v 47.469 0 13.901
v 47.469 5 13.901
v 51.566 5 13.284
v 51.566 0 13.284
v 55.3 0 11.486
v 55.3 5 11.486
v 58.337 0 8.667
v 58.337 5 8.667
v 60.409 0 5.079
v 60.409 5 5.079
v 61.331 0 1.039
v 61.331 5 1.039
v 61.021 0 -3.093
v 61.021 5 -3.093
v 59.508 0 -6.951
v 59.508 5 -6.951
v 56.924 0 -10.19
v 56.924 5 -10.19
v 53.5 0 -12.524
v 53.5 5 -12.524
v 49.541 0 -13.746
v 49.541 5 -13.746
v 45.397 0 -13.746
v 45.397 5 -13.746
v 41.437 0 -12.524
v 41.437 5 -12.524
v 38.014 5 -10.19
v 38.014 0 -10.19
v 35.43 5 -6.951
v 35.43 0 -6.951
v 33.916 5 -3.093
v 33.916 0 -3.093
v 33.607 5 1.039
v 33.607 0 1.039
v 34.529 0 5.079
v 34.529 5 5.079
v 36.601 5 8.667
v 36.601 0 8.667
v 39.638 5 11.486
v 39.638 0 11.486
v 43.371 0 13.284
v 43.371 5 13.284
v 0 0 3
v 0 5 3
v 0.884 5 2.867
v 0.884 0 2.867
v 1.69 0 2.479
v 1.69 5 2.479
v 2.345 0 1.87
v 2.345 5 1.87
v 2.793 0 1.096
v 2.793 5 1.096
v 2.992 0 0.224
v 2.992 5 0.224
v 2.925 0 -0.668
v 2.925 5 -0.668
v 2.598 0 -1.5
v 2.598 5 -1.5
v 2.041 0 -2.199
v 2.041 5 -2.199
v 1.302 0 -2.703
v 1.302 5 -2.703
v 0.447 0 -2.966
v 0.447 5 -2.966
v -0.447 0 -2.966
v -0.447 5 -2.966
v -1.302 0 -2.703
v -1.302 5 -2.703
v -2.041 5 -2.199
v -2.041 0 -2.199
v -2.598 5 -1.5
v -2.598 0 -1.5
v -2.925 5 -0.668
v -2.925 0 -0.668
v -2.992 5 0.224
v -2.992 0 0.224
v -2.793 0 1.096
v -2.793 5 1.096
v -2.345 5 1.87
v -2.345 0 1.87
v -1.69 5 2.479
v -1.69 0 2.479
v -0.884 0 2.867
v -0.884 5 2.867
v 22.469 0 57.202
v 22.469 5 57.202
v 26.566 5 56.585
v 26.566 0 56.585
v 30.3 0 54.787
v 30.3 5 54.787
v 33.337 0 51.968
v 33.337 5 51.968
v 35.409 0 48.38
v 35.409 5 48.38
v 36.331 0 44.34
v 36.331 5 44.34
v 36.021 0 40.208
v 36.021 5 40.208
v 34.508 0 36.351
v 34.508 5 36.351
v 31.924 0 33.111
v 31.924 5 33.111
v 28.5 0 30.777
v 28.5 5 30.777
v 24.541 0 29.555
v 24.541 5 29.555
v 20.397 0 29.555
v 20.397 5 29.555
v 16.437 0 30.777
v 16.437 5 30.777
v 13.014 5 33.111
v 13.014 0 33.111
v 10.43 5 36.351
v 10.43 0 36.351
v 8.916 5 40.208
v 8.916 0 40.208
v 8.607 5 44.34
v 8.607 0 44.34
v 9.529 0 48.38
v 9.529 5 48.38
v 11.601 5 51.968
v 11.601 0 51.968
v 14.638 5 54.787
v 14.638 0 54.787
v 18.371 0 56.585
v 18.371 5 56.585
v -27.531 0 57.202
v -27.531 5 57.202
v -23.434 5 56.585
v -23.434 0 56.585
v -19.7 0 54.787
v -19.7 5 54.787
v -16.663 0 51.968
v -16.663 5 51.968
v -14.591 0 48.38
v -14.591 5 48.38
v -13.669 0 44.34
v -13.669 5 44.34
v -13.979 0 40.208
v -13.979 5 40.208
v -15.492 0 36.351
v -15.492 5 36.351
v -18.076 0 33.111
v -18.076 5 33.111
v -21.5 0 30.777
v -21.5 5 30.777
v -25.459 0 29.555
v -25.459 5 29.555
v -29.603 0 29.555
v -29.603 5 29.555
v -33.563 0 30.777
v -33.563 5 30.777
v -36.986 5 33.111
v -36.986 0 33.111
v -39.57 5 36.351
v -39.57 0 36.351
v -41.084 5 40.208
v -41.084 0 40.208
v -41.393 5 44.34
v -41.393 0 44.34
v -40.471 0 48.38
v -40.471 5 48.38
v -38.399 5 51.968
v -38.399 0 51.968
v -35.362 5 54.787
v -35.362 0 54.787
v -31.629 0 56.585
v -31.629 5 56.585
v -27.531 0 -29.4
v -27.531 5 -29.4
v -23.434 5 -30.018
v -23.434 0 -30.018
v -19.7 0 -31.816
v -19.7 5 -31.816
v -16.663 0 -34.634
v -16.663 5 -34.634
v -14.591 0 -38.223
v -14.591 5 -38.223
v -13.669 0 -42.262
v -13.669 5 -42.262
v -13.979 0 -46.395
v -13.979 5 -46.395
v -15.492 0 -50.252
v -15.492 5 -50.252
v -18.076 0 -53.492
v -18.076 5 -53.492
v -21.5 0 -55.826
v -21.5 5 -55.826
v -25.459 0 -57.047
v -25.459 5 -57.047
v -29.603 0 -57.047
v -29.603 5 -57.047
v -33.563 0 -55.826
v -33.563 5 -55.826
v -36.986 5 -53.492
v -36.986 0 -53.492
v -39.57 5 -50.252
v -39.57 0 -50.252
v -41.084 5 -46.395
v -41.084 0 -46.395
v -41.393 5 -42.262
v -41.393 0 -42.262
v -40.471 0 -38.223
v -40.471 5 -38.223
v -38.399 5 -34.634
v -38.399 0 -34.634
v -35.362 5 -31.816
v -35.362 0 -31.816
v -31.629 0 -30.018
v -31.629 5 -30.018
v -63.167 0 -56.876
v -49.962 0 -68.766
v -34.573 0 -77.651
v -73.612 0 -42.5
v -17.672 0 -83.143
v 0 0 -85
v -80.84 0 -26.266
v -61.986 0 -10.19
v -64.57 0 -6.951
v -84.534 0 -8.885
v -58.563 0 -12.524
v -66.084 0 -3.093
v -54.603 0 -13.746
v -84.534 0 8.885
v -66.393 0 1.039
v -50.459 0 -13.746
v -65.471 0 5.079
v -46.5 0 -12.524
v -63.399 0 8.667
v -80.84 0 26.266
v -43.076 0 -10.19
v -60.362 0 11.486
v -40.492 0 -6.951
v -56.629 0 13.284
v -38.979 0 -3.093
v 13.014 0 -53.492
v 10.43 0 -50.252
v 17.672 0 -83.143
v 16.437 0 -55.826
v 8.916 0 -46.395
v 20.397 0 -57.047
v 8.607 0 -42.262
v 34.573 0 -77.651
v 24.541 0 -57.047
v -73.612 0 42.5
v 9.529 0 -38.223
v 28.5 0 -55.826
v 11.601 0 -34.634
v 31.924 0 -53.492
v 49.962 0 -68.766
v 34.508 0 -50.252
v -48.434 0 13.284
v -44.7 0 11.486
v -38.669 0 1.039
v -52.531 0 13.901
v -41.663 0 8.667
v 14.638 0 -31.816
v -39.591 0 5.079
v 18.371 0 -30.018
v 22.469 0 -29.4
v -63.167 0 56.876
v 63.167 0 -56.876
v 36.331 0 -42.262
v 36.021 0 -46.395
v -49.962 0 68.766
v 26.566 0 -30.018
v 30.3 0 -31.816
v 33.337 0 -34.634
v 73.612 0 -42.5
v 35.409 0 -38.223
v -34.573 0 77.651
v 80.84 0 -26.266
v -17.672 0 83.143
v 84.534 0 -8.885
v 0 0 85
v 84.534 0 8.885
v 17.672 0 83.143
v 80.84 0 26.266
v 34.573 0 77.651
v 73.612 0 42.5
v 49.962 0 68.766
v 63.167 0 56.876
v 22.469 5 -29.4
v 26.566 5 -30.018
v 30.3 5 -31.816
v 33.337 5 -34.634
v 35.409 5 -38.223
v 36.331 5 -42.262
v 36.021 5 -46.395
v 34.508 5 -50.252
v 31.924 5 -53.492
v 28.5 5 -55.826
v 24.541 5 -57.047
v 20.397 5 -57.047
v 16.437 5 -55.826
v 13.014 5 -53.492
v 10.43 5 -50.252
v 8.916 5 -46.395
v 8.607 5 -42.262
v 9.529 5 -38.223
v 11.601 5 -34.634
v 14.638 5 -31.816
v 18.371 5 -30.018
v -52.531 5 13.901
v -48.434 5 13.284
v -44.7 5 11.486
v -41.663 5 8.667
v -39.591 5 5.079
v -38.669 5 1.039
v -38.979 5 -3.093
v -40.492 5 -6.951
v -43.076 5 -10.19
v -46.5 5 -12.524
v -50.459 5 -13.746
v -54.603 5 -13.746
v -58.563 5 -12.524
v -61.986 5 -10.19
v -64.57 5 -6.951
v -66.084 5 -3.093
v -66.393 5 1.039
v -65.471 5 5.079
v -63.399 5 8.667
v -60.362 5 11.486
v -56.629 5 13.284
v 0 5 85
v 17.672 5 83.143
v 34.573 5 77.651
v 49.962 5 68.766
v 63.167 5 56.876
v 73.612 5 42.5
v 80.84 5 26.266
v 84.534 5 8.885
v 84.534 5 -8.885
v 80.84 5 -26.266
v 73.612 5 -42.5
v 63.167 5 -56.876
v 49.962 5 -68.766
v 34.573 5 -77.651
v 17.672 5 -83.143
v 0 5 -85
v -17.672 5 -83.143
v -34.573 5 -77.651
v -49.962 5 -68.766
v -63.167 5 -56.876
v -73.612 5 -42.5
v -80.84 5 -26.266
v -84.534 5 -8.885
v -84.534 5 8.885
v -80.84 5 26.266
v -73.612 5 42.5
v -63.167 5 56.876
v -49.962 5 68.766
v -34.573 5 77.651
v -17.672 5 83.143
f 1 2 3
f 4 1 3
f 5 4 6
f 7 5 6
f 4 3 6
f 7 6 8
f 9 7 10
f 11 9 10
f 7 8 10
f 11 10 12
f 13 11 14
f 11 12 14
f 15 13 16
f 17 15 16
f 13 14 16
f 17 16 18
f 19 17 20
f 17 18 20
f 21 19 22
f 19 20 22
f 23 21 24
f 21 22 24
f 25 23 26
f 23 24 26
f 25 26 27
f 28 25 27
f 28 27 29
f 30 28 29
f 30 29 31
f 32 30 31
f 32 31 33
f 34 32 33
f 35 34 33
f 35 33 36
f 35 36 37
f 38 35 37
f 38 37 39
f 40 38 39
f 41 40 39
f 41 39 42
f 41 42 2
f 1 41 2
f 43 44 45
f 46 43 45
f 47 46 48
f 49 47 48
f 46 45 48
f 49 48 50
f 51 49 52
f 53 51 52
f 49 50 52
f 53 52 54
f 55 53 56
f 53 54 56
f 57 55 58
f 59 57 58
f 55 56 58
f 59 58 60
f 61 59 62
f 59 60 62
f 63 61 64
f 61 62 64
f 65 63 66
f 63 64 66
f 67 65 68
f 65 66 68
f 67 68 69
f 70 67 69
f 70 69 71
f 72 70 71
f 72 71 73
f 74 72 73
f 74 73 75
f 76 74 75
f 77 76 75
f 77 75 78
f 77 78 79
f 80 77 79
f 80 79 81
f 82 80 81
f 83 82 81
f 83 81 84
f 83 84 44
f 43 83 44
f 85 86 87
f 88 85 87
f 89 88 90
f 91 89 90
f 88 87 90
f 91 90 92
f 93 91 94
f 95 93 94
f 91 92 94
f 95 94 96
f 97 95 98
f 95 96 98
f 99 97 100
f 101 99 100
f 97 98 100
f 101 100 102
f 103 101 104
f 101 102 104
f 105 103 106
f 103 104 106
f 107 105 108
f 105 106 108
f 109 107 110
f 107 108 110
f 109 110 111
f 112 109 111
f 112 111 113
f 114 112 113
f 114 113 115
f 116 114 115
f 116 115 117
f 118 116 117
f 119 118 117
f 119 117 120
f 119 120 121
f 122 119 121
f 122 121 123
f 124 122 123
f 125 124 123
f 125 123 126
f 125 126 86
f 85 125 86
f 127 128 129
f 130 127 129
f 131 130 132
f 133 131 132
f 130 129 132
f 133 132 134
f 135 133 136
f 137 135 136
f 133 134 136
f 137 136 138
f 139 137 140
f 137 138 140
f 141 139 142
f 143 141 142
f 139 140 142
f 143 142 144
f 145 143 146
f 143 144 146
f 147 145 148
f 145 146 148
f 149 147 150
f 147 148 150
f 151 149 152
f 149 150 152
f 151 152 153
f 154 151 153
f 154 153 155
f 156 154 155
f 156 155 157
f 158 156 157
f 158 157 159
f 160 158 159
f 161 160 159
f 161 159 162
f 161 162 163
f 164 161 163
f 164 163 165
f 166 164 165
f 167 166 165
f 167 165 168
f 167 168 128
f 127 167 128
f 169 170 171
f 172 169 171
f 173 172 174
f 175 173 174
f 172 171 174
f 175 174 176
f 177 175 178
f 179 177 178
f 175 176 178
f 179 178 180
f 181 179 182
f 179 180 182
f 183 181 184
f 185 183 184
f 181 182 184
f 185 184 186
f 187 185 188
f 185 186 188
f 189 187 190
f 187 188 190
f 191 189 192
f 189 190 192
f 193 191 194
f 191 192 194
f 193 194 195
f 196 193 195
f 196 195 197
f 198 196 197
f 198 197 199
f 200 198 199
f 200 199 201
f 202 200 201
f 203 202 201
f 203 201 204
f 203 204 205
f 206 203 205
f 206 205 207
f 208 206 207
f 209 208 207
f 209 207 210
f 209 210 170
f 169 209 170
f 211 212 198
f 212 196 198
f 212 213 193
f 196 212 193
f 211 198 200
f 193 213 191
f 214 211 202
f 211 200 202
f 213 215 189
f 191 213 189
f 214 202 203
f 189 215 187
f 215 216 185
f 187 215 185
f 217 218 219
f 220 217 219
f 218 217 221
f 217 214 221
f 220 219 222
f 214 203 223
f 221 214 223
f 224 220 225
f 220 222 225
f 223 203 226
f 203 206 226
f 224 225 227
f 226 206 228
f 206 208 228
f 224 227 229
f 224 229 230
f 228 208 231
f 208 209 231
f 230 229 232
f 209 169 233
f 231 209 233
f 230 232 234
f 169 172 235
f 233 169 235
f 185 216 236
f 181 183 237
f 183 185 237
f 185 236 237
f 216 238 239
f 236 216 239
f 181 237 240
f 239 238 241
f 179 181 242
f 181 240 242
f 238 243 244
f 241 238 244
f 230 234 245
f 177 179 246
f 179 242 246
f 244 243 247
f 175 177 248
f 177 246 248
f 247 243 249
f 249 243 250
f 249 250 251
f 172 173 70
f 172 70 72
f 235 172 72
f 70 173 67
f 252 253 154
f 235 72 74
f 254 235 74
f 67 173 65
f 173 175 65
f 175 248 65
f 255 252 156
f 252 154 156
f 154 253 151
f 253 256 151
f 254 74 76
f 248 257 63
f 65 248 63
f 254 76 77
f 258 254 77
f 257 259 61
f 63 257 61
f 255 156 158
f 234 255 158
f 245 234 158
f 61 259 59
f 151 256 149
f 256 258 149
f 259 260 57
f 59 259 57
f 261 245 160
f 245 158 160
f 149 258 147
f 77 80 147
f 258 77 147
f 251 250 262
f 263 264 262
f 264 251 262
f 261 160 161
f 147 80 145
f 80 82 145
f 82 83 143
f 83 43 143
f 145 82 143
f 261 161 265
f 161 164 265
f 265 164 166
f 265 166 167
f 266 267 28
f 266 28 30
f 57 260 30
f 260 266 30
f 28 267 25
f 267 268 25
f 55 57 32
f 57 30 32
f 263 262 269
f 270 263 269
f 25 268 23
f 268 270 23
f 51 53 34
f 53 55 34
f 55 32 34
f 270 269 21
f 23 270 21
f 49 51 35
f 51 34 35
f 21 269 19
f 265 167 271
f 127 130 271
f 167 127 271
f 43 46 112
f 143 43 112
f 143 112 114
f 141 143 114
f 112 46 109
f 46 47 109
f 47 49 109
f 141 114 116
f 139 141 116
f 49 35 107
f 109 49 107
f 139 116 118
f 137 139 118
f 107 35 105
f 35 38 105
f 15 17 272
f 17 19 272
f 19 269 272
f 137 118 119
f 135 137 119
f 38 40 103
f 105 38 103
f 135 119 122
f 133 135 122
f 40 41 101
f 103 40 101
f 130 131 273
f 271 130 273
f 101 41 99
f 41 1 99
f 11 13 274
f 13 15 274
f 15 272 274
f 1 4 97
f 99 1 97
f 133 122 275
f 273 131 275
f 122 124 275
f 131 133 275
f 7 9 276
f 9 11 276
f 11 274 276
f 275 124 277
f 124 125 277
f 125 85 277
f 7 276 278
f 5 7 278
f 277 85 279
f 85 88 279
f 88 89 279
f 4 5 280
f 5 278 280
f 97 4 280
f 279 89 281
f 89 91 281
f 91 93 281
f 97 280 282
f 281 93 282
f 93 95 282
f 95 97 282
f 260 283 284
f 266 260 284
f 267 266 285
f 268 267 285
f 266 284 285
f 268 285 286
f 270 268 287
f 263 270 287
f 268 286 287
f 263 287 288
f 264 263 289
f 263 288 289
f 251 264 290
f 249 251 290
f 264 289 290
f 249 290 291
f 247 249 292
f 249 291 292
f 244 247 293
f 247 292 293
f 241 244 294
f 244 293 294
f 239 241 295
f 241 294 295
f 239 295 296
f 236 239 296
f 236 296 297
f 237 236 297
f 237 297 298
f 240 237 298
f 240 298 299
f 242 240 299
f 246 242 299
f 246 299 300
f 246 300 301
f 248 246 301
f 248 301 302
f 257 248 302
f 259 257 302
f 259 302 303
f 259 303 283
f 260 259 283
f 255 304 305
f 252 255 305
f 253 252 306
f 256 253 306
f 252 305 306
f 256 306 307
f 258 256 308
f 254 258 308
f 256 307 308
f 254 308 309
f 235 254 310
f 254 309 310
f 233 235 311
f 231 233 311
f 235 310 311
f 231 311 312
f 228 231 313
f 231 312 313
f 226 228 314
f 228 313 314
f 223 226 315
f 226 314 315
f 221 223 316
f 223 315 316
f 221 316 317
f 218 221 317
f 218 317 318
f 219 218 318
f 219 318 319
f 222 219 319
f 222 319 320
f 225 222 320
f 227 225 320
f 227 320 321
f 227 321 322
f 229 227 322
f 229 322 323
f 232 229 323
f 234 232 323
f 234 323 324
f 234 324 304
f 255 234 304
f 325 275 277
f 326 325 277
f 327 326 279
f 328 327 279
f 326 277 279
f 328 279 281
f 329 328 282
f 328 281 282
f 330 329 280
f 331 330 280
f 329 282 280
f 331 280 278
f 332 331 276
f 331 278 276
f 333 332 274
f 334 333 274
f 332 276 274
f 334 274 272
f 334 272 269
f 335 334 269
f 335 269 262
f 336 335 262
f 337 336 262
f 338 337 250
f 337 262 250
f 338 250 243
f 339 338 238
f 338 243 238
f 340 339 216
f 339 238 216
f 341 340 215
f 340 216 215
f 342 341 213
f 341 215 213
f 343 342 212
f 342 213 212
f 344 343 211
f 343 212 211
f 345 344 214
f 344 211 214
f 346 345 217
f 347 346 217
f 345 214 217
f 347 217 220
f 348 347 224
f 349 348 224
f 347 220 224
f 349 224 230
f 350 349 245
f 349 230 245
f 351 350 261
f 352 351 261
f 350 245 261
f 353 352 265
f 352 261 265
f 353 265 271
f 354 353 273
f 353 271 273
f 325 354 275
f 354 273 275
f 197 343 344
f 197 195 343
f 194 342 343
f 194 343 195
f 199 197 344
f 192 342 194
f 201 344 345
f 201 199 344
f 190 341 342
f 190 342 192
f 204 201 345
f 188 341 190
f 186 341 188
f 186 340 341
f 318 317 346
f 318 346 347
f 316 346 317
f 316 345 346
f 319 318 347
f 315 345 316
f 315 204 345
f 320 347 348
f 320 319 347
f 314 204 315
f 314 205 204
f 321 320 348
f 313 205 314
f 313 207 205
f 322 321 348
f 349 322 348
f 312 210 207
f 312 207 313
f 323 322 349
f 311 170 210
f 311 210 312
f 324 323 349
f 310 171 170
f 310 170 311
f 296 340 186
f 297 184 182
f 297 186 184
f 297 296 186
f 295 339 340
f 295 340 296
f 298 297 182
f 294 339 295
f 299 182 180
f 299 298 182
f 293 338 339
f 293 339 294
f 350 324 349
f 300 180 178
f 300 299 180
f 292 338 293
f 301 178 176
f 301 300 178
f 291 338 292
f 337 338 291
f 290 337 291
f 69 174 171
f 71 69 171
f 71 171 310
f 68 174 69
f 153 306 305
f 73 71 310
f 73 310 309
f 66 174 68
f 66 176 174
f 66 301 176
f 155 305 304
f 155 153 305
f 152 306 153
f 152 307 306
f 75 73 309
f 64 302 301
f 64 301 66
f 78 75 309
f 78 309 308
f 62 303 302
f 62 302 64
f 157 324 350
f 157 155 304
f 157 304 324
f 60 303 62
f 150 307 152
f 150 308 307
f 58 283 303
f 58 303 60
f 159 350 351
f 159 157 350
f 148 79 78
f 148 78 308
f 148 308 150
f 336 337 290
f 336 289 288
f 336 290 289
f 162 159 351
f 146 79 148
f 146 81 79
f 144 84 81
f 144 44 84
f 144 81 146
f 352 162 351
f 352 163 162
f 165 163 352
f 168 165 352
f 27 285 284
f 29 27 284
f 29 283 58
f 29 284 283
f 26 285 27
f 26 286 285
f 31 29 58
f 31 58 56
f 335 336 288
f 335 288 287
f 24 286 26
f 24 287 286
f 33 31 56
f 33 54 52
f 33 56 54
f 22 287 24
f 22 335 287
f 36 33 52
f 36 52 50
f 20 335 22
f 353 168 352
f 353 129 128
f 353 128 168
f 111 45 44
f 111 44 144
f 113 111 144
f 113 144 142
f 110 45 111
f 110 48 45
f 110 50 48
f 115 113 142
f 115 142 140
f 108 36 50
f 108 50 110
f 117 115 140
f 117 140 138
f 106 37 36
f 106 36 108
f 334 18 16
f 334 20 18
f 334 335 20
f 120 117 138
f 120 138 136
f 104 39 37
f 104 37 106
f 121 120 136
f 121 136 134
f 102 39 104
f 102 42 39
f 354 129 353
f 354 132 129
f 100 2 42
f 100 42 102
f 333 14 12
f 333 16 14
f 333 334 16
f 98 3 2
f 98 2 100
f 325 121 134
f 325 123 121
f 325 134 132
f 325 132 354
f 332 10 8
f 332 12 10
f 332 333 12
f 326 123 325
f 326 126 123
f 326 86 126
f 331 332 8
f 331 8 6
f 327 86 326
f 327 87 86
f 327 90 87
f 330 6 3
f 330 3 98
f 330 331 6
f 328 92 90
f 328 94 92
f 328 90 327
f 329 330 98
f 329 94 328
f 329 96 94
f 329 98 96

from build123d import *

# Parameters (mm, degrees)
SKETCH2_R           = 85
BOSS_EXTRUDE1_DEPTH = 5
SKETCH3_R           = 13.901120553
CUT_EXTRUDE1_DEPTH  = 121.312094155
SKETCH4_R           = 3
CUT_EXTRUDE2_DEPTH  = 10


with BuildPart() as part:
    # Sketch2 → Boss-Extrude1 (new body)
    with BuildSketch(Plane(origin=(0, 0, 0), x_dir=(1, 0, 0), z_dir=(0, 1, 0))):
        with Locations(Location((0, 0, 0), (0, 0, 270))):
            Circle(SKETCH2_R)
    extrude(amount=BOSS_EXTRUDE1_DEPTH)

    # Sketch3 → Cut-Extrude1 (cut, through all)
    with BuildSketch(Plane(origin=(0, 5, 0), x_dir=(1, 0, 0), z_dir=(0, 1, 0))):
        with Locations(Location((47.468904606, 0, 0), (0, 0, 270))):
            Circle(SKETCH3_R)
        with Locations(Location((22.468904606, -43.301270189, 0), (0, 0, 270))):
            Circle(SKETCH3_R)
        with Locations(Location((-27.531095394, -43.301270189, 0), (0, 0, 270))):
            Circle(SKETCH3_R)
        with Locations(Location((-52.531095394, 0, 0), (0, 0, 270))):
            Circle(SKETCH3_R)
        with Locations(Location((-27.531095394, 43.301270189, 0), (0, 0, 270))):
            Circle(SKETCH3_R)
        with Locations(Location((22.468904606, 43.301270189, 0), (0, 0, 270))):
            Circle(SKETCH3_R)
    extrude(amount=-CUT_EXTRUDE1_DEPTH, mode=Mode.SUBTRACT)

    # Sketch4 → Cut-Extrude2 (cut)
    with BuildSketch(Plane(origin=(0, 5, 0), x_dir=(1, 0, 0), z_dir=(0, 1, 0))):
        with Locations(Location((0, 0, 0), (0, 0, 270))):
            Circle(SKETCH4_R)
    extrude(amount=-CUT_EXTRUDE2_DEPTH, mode=Mode.SUBTRACT)


solid = part.part
